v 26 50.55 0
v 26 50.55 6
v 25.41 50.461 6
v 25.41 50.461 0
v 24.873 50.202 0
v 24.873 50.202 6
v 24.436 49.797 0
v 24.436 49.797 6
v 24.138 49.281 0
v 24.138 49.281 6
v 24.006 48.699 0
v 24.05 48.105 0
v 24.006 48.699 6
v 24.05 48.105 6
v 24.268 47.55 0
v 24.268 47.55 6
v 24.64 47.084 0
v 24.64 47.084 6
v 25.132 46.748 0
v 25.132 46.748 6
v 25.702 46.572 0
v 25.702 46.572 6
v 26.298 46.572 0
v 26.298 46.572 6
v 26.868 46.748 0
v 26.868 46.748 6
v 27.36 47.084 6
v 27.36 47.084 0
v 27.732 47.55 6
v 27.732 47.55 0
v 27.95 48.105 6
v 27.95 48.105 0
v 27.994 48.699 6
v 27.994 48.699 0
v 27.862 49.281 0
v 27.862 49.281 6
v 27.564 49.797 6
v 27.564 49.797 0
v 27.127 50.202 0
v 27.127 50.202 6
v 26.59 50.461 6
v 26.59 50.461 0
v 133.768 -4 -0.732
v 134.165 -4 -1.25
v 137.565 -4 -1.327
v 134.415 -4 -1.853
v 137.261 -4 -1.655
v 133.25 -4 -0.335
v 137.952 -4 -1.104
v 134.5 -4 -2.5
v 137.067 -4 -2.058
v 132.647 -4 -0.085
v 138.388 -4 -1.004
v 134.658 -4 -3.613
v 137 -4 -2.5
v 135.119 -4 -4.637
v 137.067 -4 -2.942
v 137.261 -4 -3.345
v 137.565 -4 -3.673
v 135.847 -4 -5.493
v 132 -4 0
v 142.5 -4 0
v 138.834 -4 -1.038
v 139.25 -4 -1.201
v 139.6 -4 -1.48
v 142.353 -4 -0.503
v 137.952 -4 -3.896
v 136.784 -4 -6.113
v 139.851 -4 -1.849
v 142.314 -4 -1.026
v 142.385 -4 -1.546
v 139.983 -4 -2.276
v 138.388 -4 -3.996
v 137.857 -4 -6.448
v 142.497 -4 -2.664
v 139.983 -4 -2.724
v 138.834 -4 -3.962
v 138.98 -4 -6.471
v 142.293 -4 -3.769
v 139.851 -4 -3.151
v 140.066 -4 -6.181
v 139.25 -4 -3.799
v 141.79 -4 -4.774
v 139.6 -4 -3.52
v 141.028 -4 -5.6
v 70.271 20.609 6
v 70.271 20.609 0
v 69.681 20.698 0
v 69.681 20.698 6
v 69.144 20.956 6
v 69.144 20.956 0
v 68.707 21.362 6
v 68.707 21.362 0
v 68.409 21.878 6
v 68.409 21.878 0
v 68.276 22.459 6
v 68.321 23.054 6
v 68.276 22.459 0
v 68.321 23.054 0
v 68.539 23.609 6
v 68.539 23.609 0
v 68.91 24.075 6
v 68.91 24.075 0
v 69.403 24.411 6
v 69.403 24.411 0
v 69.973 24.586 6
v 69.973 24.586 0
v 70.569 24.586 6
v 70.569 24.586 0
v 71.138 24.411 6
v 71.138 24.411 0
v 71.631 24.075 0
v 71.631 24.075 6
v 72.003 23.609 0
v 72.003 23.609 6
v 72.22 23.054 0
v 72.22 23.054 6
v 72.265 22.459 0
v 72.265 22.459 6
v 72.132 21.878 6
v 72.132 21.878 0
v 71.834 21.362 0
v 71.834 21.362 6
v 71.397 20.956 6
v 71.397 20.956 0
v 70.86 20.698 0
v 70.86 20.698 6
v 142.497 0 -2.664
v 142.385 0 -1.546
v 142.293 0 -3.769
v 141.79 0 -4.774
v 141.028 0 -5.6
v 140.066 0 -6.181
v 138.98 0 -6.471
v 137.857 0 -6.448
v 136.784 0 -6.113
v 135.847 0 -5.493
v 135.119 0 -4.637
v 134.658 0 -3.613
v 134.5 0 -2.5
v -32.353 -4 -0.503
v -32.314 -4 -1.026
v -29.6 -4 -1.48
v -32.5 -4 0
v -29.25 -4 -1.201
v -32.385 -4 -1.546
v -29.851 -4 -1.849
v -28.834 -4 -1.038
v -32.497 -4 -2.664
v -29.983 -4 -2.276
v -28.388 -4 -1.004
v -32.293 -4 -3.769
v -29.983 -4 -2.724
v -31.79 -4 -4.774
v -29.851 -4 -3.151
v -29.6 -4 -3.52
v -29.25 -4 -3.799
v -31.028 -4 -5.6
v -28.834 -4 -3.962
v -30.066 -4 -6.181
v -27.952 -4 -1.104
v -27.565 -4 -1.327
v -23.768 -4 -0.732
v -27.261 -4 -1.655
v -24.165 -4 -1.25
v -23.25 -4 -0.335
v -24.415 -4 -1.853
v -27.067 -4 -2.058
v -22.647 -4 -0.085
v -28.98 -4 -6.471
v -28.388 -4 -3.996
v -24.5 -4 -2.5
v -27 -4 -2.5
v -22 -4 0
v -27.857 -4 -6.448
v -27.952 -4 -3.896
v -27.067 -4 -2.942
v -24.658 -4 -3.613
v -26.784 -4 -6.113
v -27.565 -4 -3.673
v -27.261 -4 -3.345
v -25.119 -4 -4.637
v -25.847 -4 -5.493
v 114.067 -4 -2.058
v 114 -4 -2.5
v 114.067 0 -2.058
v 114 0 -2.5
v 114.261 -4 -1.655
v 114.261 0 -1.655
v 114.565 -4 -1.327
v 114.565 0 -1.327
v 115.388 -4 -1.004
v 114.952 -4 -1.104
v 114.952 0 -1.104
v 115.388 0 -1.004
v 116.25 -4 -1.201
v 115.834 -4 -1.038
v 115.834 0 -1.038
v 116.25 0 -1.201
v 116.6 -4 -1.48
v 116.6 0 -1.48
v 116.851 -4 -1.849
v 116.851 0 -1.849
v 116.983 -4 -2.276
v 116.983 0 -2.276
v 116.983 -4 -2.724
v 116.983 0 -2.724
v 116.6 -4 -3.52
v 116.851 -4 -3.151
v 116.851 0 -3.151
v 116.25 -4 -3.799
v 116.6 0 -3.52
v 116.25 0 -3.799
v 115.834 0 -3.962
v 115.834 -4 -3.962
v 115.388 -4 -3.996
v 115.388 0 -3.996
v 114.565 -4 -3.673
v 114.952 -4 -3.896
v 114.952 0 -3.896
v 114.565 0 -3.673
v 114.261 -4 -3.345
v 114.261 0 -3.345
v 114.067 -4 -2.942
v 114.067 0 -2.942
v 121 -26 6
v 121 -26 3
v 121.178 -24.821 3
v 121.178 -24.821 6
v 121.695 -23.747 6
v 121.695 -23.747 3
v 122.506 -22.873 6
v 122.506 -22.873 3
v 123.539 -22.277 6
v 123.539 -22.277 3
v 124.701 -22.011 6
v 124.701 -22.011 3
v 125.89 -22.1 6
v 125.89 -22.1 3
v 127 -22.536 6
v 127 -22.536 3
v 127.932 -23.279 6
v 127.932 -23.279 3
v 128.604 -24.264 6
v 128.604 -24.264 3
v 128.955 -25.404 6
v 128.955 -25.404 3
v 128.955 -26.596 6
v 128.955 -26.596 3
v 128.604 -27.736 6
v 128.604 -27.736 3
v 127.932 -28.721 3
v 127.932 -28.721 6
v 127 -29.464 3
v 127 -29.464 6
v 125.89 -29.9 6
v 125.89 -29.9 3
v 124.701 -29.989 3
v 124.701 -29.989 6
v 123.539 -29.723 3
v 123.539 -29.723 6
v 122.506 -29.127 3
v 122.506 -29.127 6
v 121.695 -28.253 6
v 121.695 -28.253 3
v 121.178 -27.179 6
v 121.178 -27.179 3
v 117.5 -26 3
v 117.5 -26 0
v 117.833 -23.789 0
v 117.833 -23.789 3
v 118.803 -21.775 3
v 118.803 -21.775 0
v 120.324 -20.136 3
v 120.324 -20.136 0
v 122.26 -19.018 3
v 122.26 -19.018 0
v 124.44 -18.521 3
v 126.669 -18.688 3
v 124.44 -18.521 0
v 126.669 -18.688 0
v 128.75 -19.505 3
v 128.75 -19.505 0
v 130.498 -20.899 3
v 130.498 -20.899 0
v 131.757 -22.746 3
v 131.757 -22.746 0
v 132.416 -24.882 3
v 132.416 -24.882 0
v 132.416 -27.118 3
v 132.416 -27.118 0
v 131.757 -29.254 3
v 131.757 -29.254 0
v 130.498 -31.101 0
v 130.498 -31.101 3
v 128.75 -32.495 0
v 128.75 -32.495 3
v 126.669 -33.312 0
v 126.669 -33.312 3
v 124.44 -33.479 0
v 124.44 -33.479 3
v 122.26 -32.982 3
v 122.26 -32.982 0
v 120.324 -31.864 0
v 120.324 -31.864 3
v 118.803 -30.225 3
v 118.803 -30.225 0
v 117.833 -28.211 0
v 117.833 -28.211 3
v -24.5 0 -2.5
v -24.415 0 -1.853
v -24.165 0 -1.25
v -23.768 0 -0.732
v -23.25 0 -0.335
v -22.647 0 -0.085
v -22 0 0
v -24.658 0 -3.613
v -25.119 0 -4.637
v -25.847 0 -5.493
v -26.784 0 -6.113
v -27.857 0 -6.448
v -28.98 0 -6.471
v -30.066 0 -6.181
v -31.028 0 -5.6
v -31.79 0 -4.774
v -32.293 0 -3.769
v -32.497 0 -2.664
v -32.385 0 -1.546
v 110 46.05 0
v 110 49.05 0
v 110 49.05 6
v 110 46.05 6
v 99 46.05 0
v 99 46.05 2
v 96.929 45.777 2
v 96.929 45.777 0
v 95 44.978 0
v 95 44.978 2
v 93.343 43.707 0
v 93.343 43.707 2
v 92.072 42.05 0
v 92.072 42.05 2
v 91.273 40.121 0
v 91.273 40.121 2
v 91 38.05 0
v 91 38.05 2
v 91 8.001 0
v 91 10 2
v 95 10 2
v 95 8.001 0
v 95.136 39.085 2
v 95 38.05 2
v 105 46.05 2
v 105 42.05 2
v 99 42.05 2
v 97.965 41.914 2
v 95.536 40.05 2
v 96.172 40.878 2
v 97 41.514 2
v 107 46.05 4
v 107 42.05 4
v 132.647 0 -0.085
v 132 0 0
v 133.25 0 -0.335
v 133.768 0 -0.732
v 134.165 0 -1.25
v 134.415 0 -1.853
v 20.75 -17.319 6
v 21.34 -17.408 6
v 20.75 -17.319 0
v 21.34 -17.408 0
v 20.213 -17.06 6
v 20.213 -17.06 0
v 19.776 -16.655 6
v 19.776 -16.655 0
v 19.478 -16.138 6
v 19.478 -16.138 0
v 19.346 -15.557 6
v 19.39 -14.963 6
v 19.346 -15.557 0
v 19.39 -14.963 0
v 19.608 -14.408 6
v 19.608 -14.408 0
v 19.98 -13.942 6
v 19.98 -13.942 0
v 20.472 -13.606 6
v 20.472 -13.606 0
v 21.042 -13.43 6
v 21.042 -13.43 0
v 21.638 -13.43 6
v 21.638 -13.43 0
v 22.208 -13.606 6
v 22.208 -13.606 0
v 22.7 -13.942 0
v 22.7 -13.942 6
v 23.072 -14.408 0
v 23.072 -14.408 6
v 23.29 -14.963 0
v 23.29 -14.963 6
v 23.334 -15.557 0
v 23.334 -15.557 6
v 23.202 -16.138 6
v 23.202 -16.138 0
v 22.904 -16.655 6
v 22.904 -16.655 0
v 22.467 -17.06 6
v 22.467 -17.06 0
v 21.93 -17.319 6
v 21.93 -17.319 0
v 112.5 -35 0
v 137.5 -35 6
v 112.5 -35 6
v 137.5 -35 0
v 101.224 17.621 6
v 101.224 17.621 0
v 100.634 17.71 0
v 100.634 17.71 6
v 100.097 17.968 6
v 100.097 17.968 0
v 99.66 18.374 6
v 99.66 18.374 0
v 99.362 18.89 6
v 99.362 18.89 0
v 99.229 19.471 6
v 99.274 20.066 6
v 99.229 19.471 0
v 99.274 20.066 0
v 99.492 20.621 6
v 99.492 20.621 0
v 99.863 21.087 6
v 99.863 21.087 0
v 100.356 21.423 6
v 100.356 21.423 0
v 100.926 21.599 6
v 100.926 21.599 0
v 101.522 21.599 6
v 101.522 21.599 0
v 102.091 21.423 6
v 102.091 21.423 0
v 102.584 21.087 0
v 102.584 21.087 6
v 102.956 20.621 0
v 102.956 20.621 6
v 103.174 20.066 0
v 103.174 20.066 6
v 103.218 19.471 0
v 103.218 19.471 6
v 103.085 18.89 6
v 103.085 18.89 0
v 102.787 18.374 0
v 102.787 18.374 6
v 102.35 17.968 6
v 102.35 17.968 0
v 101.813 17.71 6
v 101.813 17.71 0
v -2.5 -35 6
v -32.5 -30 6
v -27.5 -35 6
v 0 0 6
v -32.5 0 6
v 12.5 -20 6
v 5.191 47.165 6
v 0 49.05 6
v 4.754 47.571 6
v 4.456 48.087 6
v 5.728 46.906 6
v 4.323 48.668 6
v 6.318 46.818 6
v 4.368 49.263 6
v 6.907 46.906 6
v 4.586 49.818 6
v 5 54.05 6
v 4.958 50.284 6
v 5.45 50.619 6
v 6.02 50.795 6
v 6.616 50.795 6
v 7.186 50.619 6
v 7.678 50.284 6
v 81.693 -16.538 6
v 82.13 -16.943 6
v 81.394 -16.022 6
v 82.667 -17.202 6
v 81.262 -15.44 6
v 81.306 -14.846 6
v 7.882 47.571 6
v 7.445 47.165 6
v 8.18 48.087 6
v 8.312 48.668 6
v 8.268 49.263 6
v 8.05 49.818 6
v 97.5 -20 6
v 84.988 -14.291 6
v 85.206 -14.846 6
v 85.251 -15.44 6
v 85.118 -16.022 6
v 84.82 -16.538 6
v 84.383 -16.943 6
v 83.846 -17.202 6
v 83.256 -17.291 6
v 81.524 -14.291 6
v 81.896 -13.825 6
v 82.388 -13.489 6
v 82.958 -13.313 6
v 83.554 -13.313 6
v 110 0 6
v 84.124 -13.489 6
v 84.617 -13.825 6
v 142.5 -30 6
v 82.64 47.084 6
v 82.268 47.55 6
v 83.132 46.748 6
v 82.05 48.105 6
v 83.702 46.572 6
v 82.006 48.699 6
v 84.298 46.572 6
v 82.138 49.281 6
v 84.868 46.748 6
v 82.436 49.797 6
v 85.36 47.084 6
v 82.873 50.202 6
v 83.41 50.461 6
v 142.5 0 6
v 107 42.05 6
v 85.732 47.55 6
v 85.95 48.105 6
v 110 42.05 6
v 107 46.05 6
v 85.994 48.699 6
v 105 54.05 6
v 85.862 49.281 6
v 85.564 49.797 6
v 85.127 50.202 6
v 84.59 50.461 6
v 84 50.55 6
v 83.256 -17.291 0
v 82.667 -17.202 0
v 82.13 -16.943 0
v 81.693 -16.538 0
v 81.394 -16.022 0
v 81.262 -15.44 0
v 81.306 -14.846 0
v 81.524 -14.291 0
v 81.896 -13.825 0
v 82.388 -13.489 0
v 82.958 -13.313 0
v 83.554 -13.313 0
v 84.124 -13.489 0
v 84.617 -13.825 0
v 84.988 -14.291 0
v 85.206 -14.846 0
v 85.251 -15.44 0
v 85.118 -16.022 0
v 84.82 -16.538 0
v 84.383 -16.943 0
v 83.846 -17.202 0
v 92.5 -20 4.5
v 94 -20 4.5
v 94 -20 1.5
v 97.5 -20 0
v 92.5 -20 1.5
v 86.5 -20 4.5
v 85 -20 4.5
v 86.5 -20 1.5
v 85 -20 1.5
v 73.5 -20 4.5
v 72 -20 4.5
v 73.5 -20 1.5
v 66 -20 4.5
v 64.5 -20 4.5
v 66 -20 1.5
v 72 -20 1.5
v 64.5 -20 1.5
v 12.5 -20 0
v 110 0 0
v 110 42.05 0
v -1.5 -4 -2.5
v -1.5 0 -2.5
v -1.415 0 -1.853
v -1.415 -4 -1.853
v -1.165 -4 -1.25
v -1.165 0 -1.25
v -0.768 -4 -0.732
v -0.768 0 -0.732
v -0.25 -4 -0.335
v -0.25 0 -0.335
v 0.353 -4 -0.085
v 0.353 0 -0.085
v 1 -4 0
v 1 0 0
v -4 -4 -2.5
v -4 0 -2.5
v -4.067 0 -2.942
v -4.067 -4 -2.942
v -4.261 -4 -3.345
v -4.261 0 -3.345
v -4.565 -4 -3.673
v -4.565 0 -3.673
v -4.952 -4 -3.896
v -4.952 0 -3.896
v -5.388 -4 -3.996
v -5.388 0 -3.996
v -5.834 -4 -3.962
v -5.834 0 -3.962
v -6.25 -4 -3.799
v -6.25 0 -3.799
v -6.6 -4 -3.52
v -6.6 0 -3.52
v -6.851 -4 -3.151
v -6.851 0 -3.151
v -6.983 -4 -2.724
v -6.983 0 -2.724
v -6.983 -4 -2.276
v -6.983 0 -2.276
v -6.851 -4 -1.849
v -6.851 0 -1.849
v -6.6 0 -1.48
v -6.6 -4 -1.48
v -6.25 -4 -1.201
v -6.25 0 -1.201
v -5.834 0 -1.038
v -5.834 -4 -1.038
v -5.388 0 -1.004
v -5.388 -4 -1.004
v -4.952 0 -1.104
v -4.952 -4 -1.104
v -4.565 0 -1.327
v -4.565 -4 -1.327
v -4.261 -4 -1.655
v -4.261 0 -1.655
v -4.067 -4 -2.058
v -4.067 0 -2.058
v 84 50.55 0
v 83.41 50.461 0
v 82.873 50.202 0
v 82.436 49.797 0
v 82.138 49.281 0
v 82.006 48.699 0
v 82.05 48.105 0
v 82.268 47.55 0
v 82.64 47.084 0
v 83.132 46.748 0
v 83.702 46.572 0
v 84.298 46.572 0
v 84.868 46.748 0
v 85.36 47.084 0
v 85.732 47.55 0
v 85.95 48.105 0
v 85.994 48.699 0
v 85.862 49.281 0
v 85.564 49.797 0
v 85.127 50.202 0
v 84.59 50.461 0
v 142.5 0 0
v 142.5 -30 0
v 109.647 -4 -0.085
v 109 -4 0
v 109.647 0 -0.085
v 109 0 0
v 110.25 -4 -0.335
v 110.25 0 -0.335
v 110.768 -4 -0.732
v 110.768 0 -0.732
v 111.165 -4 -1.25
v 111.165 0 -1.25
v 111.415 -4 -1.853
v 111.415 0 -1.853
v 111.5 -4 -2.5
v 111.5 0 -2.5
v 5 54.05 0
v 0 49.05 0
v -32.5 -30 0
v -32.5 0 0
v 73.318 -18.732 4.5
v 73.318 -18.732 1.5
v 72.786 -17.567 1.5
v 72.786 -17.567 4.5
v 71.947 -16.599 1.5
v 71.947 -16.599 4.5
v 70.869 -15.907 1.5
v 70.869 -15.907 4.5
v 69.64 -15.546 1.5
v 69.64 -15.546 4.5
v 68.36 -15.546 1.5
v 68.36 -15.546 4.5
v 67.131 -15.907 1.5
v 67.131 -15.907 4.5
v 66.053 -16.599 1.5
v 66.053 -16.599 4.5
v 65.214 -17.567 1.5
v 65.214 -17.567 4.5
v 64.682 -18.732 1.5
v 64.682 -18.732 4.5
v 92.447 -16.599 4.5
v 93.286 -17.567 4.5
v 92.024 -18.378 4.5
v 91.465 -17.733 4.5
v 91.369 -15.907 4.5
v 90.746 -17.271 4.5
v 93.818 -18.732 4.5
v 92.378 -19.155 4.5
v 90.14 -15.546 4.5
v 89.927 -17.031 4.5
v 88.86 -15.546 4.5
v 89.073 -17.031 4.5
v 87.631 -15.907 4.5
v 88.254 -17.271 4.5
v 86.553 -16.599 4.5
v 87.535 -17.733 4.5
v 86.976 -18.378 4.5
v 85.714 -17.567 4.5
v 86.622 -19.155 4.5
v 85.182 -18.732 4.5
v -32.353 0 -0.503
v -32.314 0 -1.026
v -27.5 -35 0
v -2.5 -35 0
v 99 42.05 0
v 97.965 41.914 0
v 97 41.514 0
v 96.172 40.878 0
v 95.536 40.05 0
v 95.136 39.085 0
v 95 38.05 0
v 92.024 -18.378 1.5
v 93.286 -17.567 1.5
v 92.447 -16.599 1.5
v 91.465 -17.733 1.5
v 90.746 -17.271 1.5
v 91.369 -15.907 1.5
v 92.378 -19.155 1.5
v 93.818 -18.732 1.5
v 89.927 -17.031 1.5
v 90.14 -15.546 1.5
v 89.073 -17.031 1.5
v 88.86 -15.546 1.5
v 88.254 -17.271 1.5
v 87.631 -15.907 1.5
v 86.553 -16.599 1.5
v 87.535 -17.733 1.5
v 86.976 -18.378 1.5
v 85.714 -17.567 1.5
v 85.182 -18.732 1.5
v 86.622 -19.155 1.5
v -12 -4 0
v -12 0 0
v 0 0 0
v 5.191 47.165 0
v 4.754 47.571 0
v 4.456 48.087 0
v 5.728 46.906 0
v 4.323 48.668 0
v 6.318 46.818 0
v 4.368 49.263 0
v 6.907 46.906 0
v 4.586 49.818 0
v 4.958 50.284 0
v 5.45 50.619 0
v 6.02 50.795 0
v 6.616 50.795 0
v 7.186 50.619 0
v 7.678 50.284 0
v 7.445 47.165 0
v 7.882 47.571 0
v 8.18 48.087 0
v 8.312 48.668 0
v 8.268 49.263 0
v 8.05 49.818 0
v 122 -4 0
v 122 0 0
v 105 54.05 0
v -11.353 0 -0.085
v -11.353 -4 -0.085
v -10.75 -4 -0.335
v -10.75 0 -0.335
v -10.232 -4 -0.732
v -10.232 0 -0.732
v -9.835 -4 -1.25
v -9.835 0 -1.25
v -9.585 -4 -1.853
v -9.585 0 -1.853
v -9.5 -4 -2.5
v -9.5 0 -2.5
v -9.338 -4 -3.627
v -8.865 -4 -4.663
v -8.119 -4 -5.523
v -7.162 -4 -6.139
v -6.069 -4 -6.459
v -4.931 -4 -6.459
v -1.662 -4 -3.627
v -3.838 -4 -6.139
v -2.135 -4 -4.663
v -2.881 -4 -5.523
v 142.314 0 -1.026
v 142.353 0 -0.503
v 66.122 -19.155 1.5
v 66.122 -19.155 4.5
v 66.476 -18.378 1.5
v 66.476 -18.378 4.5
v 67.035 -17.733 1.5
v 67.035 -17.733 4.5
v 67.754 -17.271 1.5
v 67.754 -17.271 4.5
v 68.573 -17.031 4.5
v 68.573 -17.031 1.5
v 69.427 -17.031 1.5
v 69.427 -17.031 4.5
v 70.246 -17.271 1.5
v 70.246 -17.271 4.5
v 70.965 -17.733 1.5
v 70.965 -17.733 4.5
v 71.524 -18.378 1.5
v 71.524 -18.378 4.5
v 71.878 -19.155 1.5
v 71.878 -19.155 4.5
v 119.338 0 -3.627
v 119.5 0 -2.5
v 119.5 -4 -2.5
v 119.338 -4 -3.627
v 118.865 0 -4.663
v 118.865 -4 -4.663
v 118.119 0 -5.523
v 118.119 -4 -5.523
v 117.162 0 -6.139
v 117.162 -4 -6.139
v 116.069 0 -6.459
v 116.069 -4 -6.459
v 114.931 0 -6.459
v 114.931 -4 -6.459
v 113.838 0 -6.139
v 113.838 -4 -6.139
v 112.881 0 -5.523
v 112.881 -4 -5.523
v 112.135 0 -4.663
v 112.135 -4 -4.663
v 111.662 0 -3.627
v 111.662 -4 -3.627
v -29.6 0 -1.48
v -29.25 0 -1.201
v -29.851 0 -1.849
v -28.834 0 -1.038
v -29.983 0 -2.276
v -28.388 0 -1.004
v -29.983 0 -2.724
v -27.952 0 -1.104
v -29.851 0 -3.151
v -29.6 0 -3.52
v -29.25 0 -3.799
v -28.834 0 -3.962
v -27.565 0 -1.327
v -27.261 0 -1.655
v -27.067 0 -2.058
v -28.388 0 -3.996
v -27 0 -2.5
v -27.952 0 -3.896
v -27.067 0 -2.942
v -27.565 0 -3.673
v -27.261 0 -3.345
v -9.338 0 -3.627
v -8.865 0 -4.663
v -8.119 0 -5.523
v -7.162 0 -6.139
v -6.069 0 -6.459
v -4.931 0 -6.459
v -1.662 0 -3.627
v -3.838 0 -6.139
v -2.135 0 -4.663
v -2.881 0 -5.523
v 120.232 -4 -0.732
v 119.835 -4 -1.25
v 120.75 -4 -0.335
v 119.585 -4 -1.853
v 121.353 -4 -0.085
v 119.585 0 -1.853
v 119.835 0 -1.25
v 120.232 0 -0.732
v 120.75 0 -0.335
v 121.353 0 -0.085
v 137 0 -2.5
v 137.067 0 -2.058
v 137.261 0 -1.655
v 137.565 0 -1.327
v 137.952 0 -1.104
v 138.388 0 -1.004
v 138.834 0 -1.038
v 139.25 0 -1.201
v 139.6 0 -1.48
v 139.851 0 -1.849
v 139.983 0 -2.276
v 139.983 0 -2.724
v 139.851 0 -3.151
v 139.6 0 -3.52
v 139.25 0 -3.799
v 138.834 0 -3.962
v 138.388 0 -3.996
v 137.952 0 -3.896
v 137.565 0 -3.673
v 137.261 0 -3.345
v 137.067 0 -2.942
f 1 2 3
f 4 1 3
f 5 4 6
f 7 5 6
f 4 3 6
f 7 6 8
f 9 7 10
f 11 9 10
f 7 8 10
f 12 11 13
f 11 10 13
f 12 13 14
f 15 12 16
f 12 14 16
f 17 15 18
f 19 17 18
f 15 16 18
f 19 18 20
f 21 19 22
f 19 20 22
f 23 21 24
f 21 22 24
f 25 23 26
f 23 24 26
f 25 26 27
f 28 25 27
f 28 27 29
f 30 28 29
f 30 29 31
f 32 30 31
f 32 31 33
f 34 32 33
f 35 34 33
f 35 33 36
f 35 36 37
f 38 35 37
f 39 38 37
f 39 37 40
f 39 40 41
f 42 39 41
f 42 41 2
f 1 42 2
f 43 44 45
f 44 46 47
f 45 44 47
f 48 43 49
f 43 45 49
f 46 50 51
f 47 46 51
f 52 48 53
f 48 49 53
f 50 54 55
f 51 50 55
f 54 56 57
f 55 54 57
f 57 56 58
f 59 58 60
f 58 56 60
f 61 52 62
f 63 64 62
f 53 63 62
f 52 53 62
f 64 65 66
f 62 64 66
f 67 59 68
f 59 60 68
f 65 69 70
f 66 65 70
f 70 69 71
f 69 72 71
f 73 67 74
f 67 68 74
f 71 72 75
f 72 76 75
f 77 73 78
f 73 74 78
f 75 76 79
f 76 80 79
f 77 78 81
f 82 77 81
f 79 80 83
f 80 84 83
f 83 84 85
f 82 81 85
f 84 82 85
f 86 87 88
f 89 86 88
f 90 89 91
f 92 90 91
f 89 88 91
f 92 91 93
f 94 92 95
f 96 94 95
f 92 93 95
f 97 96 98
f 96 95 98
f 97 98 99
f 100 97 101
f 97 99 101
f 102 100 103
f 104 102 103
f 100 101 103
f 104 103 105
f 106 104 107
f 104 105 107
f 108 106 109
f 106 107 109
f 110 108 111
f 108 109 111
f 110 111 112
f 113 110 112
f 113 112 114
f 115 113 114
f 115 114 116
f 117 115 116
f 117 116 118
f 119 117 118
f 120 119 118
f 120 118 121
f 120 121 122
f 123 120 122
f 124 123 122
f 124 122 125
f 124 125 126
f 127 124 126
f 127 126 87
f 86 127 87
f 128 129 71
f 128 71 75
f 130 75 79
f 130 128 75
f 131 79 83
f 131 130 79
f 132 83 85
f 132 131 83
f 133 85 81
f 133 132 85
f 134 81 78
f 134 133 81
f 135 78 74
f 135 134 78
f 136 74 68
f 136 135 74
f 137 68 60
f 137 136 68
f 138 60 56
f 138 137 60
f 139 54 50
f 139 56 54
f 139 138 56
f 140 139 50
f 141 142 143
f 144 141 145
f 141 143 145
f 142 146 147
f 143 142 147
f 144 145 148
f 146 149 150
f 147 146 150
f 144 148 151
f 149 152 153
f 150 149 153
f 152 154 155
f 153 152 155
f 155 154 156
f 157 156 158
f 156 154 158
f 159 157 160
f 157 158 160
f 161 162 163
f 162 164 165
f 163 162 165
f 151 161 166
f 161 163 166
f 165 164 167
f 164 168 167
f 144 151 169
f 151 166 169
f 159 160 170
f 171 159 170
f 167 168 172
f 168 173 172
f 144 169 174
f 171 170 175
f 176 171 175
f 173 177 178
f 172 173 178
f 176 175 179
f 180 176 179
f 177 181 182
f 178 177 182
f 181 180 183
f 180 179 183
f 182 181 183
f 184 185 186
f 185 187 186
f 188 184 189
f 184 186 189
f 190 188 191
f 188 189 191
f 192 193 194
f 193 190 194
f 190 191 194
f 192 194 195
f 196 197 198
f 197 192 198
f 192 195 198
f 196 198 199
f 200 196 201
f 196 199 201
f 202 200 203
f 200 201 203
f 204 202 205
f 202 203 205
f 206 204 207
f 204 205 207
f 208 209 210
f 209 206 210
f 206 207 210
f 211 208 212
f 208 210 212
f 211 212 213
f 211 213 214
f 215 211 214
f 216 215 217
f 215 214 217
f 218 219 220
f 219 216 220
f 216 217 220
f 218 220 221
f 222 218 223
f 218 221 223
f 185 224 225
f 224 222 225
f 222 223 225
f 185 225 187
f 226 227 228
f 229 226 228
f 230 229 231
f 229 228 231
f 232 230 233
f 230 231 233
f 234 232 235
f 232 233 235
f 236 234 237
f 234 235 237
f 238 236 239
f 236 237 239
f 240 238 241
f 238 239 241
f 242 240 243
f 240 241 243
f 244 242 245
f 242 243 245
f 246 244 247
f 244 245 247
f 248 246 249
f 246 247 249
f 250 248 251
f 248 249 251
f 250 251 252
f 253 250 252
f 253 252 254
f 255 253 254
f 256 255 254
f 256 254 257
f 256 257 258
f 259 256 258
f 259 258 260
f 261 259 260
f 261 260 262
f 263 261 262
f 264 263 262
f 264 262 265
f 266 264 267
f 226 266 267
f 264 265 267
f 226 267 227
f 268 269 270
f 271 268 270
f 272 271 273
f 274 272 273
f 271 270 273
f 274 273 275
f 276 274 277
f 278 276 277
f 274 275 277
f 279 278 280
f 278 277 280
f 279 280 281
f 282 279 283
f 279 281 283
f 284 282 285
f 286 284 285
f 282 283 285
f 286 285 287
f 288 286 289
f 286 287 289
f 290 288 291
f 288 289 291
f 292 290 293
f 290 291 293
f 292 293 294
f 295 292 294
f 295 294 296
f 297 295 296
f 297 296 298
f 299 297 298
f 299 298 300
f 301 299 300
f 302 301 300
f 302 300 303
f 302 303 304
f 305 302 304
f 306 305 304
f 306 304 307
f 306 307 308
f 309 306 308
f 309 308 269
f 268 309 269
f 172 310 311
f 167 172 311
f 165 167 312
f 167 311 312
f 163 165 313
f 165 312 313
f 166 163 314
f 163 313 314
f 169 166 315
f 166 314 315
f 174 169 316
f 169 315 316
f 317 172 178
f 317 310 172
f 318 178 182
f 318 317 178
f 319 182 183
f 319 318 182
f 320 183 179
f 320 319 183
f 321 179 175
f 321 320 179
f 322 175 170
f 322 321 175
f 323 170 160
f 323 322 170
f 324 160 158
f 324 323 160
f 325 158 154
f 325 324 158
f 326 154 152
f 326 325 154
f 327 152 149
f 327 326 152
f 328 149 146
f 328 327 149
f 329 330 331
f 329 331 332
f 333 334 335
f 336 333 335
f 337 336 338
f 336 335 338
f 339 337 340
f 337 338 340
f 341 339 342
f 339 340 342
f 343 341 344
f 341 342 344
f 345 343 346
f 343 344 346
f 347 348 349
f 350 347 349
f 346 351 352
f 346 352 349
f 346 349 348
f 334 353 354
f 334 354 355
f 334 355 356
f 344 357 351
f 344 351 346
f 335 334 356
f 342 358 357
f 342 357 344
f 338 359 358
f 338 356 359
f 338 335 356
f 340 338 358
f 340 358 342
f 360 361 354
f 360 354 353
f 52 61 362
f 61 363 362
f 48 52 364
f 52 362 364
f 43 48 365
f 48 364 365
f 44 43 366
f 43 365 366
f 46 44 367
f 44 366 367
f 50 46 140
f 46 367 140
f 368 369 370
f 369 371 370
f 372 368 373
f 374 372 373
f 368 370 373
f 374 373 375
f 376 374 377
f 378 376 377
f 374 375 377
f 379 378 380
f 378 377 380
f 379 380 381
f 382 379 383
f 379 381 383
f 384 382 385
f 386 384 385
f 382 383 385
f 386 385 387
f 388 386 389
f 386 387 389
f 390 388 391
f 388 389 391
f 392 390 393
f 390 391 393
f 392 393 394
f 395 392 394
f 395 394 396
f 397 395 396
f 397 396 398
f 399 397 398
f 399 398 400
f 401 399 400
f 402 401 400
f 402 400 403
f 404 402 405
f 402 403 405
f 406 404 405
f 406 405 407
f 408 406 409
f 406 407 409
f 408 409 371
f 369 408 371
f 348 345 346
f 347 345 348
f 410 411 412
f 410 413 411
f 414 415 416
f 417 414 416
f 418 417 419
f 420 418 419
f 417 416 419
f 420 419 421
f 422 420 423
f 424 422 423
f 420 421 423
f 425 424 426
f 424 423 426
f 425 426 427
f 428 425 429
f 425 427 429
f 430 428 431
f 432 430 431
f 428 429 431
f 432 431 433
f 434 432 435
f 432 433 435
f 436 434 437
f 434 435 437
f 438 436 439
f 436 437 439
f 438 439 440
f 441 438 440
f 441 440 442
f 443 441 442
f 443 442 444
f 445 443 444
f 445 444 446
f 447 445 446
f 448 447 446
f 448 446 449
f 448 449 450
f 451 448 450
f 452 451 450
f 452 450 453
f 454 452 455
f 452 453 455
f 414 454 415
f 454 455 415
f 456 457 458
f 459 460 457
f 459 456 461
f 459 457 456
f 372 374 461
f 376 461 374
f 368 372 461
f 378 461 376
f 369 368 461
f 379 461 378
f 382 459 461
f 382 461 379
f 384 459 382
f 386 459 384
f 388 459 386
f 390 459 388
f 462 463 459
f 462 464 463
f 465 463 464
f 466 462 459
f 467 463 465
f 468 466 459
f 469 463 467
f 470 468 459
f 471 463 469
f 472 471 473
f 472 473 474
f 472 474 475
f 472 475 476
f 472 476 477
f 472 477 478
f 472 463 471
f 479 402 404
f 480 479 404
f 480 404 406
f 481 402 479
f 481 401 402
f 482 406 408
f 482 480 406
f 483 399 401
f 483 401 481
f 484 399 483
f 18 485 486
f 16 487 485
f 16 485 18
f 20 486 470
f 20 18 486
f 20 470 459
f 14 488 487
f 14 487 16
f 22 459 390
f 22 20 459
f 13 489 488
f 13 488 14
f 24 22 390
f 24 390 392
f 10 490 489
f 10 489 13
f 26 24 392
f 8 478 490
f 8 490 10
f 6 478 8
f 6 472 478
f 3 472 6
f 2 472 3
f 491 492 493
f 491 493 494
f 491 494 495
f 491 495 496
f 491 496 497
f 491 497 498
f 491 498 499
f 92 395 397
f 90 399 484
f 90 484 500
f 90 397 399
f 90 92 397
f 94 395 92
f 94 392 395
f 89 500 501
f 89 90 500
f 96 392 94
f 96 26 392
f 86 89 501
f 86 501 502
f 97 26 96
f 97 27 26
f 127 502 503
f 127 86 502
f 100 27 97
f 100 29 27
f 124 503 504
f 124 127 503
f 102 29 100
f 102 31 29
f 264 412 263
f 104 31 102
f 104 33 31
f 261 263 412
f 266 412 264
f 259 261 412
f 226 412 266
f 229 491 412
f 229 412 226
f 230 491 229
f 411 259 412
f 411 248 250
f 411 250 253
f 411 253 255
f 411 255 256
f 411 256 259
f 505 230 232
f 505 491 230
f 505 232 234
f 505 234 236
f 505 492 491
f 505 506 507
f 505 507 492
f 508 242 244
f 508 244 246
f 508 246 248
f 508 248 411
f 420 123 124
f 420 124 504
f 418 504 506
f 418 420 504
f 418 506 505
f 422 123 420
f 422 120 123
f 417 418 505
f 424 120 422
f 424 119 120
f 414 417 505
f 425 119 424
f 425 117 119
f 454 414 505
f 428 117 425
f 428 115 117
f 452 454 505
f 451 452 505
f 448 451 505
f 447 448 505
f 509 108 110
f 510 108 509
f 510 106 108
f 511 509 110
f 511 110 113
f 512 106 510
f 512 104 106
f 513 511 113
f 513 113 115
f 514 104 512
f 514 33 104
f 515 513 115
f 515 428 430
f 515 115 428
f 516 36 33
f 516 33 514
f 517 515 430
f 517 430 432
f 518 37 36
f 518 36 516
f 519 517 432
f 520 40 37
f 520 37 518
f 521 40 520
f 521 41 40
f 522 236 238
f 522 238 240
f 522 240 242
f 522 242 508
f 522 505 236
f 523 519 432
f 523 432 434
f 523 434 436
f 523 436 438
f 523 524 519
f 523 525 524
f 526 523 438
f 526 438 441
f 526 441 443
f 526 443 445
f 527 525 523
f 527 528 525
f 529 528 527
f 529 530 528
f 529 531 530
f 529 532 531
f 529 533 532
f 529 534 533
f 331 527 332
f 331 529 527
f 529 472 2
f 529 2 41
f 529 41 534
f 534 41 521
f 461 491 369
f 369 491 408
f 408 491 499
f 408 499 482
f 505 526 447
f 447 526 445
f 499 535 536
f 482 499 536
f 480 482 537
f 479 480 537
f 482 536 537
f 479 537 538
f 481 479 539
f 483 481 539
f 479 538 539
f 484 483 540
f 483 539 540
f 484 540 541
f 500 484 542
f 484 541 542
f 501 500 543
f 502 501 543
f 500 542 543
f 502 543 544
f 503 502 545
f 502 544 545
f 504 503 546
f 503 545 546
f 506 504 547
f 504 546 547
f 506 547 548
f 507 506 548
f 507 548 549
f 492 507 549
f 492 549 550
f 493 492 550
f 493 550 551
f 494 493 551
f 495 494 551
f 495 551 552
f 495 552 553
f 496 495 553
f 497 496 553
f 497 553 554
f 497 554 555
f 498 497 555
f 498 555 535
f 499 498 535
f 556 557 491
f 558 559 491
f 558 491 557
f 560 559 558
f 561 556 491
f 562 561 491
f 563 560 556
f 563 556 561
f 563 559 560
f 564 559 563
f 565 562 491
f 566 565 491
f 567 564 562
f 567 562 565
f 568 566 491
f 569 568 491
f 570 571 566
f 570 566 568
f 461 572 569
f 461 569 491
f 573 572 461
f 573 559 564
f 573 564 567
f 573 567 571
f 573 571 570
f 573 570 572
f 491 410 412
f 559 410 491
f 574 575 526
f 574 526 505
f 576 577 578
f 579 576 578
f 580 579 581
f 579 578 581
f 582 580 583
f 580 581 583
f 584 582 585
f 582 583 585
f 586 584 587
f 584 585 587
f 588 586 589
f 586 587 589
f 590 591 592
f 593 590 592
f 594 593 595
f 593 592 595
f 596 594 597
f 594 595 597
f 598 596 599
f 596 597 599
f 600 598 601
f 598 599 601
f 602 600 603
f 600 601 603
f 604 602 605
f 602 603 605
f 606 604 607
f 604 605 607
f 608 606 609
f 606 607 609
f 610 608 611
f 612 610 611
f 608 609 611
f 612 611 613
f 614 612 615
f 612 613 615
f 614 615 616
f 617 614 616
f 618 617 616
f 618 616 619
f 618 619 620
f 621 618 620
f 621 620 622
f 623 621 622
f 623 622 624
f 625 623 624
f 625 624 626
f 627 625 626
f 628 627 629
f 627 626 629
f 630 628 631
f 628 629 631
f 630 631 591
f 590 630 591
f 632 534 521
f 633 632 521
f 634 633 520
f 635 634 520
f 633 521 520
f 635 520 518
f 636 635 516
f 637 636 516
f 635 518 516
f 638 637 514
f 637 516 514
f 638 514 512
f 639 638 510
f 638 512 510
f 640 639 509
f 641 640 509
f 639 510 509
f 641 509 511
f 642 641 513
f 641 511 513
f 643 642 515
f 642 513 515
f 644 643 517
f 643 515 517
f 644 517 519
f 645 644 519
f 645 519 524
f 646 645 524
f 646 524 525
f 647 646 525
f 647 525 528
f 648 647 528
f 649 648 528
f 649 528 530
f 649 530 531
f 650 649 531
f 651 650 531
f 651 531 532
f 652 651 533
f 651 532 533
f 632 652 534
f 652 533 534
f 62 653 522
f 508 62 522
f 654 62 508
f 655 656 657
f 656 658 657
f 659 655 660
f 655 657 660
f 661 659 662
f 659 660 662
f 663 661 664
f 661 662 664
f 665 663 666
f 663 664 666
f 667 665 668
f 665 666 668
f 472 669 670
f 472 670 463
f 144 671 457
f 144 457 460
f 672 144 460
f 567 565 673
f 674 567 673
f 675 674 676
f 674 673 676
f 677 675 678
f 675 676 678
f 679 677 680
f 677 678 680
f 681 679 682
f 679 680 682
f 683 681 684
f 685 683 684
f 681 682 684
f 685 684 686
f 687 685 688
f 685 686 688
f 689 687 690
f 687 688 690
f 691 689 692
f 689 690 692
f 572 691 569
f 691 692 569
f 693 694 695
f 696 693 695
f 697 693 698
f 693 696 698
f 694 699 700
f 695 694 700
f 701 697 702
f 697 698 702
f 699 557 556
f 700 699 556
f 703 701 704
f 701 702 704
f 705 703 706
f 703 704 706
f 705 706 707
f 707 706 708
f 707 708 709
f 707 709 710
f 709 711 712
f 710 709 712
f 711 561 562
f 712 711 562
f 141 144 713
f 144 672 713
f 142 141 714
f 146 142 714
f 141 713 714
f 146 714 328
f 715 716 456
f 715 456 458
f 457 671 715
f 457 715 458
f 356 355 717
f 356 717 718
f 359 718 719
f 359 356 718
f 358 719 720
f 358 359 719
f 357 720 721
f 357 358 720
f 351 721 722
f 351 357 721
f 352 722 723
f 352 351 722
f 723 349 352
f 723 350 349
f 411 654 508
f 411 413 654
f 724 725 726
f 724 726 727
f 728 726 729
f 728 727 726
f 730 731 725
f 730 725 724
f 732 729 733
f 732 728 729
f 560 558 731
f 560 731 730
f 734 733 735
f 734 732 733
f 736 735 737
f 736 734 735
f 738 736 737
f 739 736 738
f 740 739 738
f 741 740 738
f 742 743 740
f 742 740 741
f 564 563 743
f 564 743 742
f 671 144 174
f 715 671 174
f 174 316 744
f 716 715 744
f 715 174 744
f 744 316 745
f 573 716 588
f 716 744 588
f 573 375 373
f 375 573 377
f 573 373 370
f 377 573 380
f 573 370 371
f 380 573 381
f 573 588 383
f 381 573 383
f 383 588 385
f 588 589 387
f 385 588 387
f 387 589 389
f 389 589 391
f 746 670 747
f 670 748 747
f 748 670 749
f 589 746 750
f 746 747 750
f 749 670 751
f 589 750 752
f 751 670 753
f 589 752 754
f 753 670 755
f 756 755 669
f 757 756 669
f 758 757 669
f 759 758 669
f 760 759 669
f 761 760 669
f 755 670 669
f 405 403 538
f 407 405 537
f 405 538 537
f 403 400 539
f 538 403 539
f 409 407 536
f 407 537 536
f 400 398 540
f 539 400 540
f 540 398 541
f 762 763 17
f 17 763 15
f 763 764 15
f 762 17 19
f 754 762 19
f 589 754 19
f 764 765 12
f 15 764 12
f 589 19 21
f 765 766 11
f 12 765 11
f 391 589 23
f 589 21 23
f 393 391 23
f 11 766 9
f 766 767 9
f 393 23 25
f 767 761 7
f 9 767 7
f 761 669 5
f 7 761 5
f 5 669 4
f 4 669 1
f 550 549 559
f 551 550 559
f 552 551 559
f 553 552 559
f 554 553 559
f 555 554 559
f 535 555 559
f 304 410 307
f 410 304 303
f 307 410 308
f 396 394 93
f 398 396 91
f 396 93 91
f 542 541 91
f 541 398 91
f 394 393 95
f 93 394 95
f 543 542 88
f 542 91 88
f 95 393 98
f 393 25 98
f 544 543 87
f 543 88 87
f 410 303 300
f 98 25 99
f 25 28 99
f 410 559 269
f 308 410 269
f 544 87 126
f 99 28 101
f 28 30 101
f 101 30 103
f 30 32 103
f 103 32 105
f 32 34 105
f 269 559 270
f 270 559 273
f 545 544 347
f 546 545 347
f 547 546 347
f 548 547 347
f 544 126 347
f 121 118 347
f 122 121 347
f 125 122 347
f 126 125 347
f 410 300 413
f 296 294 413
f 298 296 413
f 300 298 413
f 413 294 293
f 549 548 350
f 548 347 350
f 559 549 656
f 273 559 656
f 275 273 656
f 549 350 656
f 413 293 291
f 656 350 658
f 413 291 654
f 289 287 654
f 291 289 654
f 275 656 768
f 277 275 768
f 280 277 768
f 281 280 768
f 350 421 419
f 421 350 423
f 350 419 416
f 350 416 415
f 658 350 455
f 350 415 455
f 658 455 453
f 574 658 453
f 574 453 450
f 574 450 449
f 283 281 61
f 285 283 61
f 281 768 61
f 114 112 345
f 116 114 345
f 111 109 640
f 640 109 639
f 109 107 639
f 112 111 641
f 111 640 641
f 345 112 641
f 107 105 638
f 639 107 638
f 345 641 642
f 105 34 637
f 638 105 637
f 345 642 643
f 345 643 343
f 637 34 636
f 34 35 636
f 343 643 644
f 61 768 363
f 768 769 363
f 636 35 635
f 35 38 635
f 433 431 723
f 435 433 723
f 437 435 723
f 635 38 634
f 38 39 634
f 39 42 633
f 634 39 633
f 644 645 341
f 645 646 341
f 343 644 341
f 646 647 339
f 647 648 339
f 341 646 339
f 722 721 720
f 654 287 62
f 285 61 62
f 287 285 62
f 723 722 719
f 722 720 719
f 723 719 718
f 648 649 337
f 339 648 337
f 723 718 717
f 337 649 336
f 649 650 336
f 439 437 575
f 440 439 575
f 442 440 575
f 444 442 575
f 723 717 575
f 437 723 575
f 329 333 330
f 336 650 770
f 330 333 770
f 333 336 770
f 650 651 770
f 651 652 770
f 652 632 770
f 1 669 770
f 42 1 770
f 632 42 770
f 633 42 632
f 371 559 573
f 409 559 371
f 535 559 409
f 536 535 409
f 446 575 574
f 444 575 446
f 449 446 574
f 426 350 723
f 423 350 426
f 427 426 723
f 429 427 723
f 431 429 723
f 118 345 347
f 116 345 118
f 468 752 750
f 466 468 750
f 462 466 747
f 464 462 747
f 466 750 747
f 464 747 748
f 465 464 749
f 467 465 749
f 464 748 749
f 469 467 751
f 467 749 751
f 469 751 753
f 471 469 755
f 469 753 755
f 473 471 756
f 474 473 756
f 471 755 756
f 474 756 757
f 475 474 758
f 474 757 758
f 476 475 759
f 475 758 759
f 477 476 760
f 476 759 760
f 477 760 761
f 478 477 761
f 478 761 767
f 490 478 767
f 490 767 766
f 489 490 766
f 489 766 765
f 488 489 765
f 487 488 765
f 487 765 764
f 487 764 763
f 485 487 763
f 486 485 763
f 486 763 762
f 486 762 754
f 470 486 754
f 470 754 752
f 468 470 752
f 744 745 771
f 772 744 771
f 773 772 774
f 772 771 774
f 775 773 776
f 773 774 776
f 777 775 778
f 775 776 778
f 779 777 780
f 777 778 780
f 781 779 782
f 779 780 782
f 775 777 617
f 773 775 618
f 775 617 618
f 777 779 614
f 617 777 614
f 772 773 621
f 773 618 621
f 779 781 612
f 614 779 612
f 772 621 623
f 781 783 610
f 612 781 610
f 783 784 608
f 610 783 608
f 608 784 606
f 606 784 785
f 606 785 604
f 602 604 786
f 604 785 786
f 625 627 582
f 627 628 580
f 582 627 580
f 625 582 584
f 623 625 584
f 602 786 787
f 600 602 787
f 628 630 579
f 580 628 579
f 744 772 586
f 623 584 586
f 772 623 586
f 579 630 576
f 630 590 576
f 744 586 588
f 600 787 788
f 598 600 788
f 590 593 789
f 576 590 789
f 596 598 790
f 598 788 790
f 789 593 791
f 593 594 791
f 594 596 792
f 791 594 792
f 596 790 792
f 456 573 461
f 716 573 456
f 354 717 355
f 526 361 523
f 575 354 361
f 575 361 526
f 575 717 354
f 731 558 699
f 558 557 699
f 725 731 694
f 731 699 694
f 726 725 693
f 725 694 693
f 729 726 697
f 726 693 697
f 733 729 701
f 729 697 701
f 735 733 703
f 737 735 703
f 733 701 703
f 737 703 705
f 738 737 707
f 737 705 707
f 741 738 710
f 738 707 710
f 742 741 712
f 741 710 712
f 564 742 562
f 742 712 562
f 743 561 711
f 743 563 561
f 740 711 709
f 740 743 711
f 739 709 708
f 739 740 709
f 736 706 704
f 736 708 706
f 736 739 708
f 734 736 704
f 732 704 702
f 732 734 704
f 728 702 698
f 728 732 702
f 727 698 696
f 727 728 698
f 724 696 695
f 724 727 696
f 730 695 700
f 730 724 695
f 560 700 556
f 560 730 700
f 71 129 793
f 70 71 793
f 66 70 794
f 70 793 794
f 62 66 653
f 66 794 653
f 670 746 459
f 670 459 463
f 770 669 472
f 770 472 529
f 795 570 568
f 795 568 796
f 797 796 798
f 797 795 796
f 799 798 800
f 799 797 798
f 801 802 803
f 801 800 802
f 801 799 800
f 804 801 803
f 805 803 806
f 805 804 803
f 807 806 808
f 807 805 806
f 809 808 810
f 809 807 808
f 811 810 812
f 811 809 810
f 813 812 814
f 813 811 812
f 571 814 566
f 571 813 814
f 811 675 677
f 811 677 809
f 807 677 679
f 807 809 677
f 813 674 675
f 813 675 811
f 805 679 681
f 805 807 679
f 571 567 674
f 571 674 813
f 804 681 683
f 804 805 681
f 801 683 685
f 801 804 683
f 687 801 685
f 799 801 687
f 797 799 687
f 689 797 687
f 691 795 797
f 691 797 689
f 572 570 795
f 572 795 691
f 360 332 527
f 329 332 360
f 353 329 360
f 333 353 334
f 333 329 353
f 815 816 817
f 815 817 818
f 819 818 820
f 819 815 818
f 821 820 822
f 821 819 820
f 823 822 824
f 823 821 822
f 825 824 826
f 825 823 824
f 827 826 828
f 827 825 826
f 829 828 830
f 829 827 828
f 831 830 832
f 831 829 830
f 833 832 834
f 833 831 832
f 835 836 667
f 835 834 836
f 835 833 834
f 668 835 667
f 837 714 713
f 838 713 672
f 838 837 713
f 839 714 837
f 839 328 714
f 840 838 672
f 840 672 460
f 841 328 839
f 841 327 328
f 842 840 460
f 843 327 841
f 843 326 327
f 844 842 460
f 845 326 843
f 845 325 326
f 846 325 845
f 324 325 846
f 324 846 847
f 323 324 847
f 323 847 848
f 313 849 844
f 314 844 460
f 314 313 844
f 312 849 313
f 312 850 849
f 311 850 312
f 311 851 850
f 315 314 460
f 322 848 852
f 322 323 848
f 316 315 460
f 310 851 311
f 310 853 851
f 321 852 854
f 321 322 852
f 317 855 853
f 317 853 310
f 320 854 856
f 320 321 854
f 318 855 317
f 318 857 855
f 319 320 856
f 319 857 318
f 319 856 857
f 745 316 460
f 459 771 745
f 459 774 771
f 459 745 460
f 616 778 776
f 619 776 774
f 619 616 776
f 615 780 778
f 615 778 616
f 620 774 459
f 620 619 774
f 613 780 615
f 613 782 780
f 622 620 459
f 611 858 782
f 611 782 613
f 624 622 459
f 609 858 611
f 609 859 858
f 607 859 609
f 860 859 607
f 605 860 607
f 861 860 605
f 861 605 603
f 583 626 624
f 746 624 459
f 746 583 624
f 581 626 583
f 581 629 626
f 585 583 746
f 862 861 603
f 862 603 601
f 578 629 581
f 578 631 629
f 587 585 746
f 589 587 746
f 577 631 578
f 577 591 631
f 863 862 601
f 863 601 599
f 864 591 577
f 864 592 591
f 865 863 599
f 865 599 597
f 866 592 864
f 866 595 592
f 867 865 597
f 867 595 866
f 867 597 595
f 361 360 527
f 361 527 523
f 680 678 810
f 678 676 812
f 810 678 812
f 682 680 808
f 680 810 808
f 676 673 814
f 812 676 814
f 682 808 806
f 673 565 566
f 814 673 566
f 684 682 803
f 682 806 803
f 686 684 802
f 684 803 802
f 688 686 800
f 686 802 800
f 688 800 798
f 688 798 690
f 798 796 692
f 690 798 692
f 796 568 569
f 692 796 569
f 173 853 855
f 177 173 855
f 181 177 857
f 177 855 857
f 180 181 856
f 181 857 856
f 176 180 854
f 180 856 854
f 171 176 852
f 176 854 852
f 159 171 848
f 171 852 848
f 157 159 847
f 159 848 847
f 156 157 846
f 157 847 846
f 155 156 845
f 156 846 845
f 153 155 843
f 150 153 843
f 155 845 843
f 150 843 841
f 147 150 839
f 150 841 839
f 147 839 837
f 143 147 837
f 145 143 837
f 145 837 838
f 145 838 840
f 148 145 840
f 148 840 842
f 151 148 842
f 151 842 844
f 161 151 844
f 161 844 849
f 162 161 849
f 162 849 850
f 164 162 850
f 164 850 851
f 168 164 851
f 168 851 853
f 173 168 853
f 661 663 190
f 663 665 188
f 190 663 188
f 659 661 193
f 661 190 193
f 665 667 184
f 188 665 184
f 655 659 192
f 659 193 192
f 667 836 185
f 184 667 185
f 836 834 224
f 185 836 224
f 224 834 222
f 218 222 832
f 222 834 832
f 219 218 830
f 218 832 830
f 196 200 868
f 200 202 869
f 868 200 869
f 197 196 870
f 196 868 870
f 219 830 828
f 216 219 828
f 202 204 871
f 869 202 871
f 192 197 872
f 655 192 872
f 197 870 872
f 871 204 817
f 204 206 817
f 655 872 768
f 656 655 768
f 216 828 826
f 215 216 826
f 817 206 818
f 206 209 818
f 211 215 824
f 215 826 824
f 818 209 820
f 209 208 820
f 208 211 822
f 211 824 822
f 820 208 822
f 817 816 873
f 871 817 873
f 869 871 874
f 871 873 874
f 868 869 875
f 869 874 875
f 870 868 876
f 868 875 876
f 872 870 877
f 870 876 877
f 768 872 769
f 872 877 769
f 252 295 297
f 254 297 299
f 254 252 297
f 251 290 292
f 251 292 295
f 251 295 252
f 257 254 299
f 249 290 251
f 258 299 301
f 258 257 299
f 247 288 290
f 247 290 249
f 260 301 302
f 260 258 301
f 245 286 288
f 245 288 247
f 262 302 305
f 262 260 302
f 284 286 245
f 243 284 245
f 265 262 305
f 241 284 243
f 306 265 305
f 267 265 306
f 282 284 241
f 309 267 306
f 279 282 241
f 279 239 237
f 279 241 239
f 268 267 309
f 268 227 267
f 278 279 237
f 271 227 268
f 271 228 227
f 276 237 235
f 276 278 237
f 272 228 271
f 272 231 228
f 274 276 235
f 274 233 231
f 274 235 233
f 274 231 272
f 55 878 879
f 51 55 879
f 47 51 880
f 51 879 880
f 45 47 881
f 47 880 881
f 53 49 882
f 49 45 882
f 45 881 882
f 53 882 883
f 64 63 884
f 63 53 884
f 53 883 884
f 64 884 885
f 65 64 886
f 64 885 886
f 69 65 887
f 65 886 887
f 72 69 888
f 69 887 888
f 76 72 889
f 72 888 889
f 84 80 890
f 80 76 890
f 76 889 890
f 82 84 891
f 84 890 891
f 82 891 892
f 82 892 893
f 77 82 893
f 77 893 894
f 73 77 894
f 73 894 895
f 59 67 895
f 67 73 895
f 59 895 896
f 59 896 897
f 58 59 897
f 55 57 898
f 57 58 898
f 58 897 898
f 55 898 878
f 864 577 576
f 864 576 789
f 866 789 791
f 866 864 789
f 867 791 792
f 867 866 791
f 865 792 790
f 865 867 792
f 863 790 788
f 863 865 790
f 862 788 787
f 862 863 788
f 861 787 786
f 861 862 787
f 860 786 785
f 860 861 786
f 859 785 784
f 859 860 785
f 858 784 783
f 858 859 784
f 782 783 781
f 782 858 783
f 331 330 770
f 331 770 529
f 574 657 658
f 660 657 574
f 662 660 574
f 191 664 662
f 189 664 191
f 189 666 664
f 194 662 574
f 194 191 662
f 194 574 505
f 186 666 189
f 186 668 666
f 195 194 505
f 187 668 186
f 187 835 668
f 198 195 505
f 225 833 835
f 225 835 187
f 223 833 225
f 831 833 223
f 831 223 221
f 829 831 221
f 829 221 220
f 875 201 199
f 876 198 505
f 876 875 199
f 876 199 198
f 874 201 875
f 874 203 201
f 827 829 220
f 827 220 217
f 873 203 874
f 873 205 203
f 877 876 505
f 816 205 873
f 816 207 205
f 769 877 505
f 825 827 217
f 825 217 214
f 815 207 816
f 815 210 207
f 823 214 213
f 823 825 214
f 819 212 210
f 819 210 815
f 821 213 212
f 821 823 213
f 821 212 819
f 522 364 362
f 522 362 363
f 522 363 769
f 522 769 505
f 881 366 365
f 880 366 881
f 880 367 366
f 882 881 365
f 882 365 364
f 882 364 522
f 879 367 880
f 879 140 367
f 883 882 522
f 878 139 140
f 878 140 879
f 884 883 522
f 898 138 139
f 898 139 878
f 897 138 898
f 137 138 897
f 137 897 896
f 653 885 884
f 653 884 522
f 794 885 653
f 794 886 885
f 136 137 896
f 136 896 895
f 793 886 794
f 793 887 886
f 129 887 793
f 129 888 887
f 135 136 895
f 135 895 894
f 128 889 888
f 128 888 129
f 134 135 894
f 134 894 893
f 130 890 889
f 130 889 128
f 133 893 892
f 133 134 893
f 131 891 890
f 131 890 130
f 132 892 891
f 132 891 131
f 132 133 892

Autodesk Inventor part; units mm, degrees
ref_plane "YZ Plane" through (0, 0, 0) normal (1, 0, 0) x (0, 1, 0)
ref_plane "XZ Plane" through (0, 0, 0) normal (0, 1, 0) x (-1, 0, 0)
sketch "Sketch1" plane through (0, 0, 0) normal (0, 0, 1) x (1, 0, 0)
  line L0 (-32.5, 0) -> (0, 0)
  line L1 (0, 0) -> (0, 54.05)
  line L2 (0, 54.05) -> (110, 54.05)
  line L3 (110, 54.05) -> (110, 0)
  line L4 (110, 0) -> (142.5, 0)
  line L5 (142.5, 0) -> (142.5, -35)
  line L6 (142.5, -35) -> (112.5, -35)
  line L7 (112.5, -35) -> (97.5, -20)
  line L8 (97.5, -20) -> (12.5, -20)
  line L9 (12.5, -20) -> (-2.5, -35)
  line L10 (-2.5, -35) -> (-32.5, -35)
  line L11 (-32.5, -35) -> (-32.5, 0)
  dimension "d0" = 135
  dimension "d1" = 135
  dimension "d2" = 110
  dimension "d3" = 54.05
  dimension "d4" = 35
  dimension "d5" = 32.5
  dimension "d6" = 20
  dimension "d7" = 30
extrude "Extrusion1" add sketch "Sketch1" along normal blind 6
chamfer "Chamfer1" distance 5 angle 45 4 edges at (0, 54.05, 3) (110, 54.05, 3) (-32.5, -35, 3) (142.5, -35, 3)
sketch "Sketch2" plane through (110, 0, 0) normal (0, 1, 0) x (1, 0, 0)
  circle A0 centre (-138.5, 2.5) radius 1.5
  circle A1 centre (-115.5, 2.5) radius 1.5
  line L0 (-142.5, 0) -> (-142.5, -6) projected
  line L1 (-110, 0) -> (-142.5, 0) projected
  circle A2 centre (-138.5, 2.5) radius 4
  line L2 (-142.5, 0) -> (-112.5, 0) projected
  arc A3 (-142.5, 0) -> (-142.3846, 1.5461) centre (-144.8125, 0.95) ccw
  arc A4 (-134.5, 2.5) -> (-132, 0) centre (-132, 2.5) ccw
  arc A5 (-122, 0) -> (-119.5, 2.5) centre (-122, 2.5) ccw
  arc A6 (-111.5, 2.5) -> (-109, 0) centre (-109, 2.5) ccw
  circle A7 centre (-115.5, 2.5) radius 4
  line L3 (-109, 0) -> (-112.3775, 0)
  line L4 (-112.5, 0) -> (-97.5, 0) projected
  point P0 (-122, 0)
  point P1 (-132, 0)
  point P2 (-118.6225, 0)
  point P3 (-112.3775, 0)
  dimension "d13" = 3
  dimension "d14" = 3
  dimension "d15" = 4
  dimension "d16" = 27
  dimension "d17" = 2.5
  dimension "d18" = 8
extrude "Extrusion2" add sketch "Sketch2" against normal blind 4 contours L1 A2 A4 | L1 A7 A6 L3 | L1 A7 | L1 A5 A7 | L1 A2 | L1 A3 A2 picked at (-115.6011, 0.337) picked at (-138.4397, 0.337)
sketch "Sketch3" plane through (0, 0, 0) normal (0, 0, -1) x (-1, 0, 0)
  line L0 (-105, 54.05) -> (-5, 54.05) projected
  line L1 (0, 49.05) -> (0, 0) projected
  line L2 (-110, 0) -> (-110, 49.05) projected
  point P0 (-84, 48.55)
  point P1 (-26, 48.55)
  dimension "d21" = 5.5
  dimension "d22" = 26
  dimension "d23" = 26
hole "Hole1" at (84, 48.55, 0) at (26, 48.55, 0) direction (0, 0, 1) diameter 4 depth 24
sketch "Sketch4" plane through (12.5, -20, 0) normal (0, -1, 0) x (1, 0, 0)
  line L0 (74, 1.5) -> (72.5, 1.5)
  line L1 (72.5, 1.5) -> (72.5, 4.5)
  line L2 (72.5, 4.5) -> (74, 4.5)
  line L3 (74, 4.5) -> (74, 1.5)
  line L4 (77, 1.5) -> (77, 4.5)
  line L5 (-15, 0) -> (-15, 6) projected
  line L6 (85, 0) -> (85, 6) projected
  line L7 (53.5, 1.5) -> (52, 1.5)
  line L8 (52, 1.5) -> (52, 4.5)
  line L9 (52, 4.5) -> (53.5, 4.5)
  line L10 (53.5, 4.5) -> (53.5, 1.5)
  line L11 (56.5, 1.5) -> (56.5, 4.5)
  point P0 (-12.5, 0)
  point P1 (72.5, 3)
  point P2 (-15, 3)
  point P3 (77, 3)
  point P4 (74, 3)
  point P5 (53.5, 3)
  point P6 (56.5, 3)
  dimension "d31" = 1.5
  dimension "d32" = 3
  dimension "d33" = 3
  dimension "d35" = 8
  dimension "d36" = 1.5
  dimension "d37" = 3
  dimension "d38" = 3
  dimension "d39" = 16
revolve "Revolution1" cut sketch "Sketch4" angle 360 about axis through (89.5, -20, 1.5) along (0, 0, 1) contours L0 L1 L2 L3
revolve "Revolution2" cut sketch "Sketch4" angle 360 about axis through (69, -20, 1.5) along (0, 0, 1) contours L7 L8 L9 L10
ref_plane "Work Plane1" through (55, 0, 6) normal (1, 0, 0) x (0, 0, -1)
mirror "Mirror1" about plane through (55, 0, 6) normal (1, 0, 0) of "Extrusion2"
sketch "Sketch5" plane through (0, 0, 6) normal (0, 0, 1) x (1, 0, 0)
  circle A0 centre (101.2237, 19.6209) radius 1.6
  circle A1 centre (70.2706, 22.6087) radius 1.6
  circle A2 centre (21.34, -15.4078) radius 1.6
  circle A3 centre (83.2562, -15.291) radius 1.6
  circle A4 centre (6.3179, 48.8175) radius 1.6
  circle A5 centre (70.2706, 22.6087) radius 4
  circle A6 centre (101.2237, 19.6209) radius 4
  circle A7 centre (83.2562, -15.291) radius 4
  circle A8 centre (21.34, -15.4078) radius 4
  circle A9 centre (6.3179, 48.8175) radius 4
  line L0 (109, 0) -> (109, -4) projected
  line L1 (12.5, -20) -> (97.5, -20) projected
  line L2 (110, 0) -> (97.5, -20)
  circle A10 centre (26, 48.55) radius 2
  circle A11 centre (84, 48.55) radius 2
  circle A12 centre (26, 48.55) radius 4
  circle A13 centre (84, 48.55) radius 4
  circle A14 centre (84, 48.55) radius 2
  circle A15 centre (26, 48.55) radius 2
  line L3 (105, 54.05) -> (110, 49.05) projected
  line L4 (105, 54.05) -> (5, 54.05) projected
  line L5 (0, 49.05) -> (5, 54.05) projected
  line L6 (0, 49.05) -> (0, 0) projected
  line L7 (0, 0) -> (-32.5, 0) projected
  line L8 (-32.5, 0) -> (-32.5, -30) projected
  line L9 (-27.5, -35) -> (-2.5, -35) projected
  line L10 (-2.5, -35) -> (12.5, -20) projected
  line L11 (12.5, -20) -> (97.5, -20) projected
  line L12 (97.5, -20) -> (112.5, -35) projected
  line L13 (112.5, -35) -> (137.5, -35) projected
  line L14 (142.5, -30) -> (142.5, 0) projected
  line L15 (142.5, 0) -> (110, 0) projected
  line L16 (110, 0) -> (110, 49.05) projected
  line L17 (0, 49.05) -> (5, 54.05) projected
  line L18 (105, 54.05) -> (5, 54.05) projected
  line L19 (105, 54.05) -> (110, 49.05) projected
  line L20 (142.5, -30) -> (137.5, -35) projected
  line L21 (-27.5, -35) -> (-32.5, -30) projected
  circle A16 centre (6.3179, 48.8175) radius 1.6
  circle A17 centre (21.34, -15.4078) radius 1.6
  circle A18 centre (70.2706, 22.6087) radius 1.6
  circle A19 centre (101.2237, 19.6209) radius 1.6
  circle A20 centre (83.2562, -15.291) radius 1.6
  line L22 (110, 0) -> (110, 49.05) projected
  line L23 (0, 49.05) -> (0, 0) projected
  dimension "d41" = 8
  dimension "d82" = 5.5
  dimension "d83" = 5.5
  dimension "d84" = 26
  dimension "d85" = 26
hole "Hole2" at (6.3179, 48.8175, 6) at (70.2706, 22.6087, 6) at (101.2237, 19.6209, 6) at (83.2562, -15.291, 6) at (21.34, -15.4078, 6) direction (0, 0, -1) diameter 4 depth 24
sketch "Sketch6" plane through (0, 0, 0) normal (0, 0, -1) x (-1, 0, 0)
  line L0 (-110, 0) -> (-110, 49.05) projected
  line L1 (-110, 46.05) -> (-107, 46.05)
  line L2 (-107, 46.05) -> (-91, 46.05)
  line L3 (-91, 46.05) -> (-91, 10)
  line L4 (-91, 10) -> (-95, 10)
  line L5 (-95, 10) -> (-95, 42.05)
  line L6 (-95, 42.05) -> (-110, 42.05)
  line L7 (-110, 0) -> (-110, 49.05) projected
  line L8 (-12.5, -20) -> (-97.5, -20) projected
  line L9 (-107, 46.05) -> (-107, 42.05)
  point P0 (0, 0)
  dimension "d49" = 30
  dimension "d50" = 4
  dimension "d51" = 4
  dimension "d55" = 15
  dimension "d68" = 3
  dimension "d69" = 3
extrude "Extrusion3" cut sketch "Sketch6" against normal blind 2
extrude "Extrusion4" cut sketch "Sketch6" against normal through all contours L0 L1 L9 L6
fillet "Fillet1" radius 4 1 edges at (95, 42.05, 1)
fillet "Fillet2" radius 8 1 edges at (91, 46.05, 1)
chamfer "Chamfer2" distance 2 angle 45 2 edges at (93, 10, 0) (107, 44.05, 2)
sketch "Sketch7" plane through (0, 0, 0) normal (0, 0, -1) x (-1, 0, 0)
  circle A0 centre (-125, -26) radius 4
  circle A1 centre (-125, -26) radius 5 construction
  circle A2 centre (-125, -26) radius 9 construction
  line L0 (-112.5, -35) -> (-137.5, -35) projected
  circle A3 centre (-125, -26) radius 7.5
  point P0 (0, 0)
  point P1 (-125, -35)
  dimension "d70" = 8
  dimension "d71" = 10
  dimension "d72" = 18
  dimension "d75" = 15
extrude "Extrusion5" cut sketch "Sketch7" against normal through all contours A0
extrude "Extrusion6" cut sketch "Sketch7" against normal blind 3 contours A0 | A3
equation "\"d51\" = d50"
equation "\"d61\" = d60 + d50"
equation "\"MotorHeight\" = MotorHeightBase"
equation "\"d60\" = 4"
equation "\"MotorHeightBase\" = 28"
properties part number "Motor Side Foot"
